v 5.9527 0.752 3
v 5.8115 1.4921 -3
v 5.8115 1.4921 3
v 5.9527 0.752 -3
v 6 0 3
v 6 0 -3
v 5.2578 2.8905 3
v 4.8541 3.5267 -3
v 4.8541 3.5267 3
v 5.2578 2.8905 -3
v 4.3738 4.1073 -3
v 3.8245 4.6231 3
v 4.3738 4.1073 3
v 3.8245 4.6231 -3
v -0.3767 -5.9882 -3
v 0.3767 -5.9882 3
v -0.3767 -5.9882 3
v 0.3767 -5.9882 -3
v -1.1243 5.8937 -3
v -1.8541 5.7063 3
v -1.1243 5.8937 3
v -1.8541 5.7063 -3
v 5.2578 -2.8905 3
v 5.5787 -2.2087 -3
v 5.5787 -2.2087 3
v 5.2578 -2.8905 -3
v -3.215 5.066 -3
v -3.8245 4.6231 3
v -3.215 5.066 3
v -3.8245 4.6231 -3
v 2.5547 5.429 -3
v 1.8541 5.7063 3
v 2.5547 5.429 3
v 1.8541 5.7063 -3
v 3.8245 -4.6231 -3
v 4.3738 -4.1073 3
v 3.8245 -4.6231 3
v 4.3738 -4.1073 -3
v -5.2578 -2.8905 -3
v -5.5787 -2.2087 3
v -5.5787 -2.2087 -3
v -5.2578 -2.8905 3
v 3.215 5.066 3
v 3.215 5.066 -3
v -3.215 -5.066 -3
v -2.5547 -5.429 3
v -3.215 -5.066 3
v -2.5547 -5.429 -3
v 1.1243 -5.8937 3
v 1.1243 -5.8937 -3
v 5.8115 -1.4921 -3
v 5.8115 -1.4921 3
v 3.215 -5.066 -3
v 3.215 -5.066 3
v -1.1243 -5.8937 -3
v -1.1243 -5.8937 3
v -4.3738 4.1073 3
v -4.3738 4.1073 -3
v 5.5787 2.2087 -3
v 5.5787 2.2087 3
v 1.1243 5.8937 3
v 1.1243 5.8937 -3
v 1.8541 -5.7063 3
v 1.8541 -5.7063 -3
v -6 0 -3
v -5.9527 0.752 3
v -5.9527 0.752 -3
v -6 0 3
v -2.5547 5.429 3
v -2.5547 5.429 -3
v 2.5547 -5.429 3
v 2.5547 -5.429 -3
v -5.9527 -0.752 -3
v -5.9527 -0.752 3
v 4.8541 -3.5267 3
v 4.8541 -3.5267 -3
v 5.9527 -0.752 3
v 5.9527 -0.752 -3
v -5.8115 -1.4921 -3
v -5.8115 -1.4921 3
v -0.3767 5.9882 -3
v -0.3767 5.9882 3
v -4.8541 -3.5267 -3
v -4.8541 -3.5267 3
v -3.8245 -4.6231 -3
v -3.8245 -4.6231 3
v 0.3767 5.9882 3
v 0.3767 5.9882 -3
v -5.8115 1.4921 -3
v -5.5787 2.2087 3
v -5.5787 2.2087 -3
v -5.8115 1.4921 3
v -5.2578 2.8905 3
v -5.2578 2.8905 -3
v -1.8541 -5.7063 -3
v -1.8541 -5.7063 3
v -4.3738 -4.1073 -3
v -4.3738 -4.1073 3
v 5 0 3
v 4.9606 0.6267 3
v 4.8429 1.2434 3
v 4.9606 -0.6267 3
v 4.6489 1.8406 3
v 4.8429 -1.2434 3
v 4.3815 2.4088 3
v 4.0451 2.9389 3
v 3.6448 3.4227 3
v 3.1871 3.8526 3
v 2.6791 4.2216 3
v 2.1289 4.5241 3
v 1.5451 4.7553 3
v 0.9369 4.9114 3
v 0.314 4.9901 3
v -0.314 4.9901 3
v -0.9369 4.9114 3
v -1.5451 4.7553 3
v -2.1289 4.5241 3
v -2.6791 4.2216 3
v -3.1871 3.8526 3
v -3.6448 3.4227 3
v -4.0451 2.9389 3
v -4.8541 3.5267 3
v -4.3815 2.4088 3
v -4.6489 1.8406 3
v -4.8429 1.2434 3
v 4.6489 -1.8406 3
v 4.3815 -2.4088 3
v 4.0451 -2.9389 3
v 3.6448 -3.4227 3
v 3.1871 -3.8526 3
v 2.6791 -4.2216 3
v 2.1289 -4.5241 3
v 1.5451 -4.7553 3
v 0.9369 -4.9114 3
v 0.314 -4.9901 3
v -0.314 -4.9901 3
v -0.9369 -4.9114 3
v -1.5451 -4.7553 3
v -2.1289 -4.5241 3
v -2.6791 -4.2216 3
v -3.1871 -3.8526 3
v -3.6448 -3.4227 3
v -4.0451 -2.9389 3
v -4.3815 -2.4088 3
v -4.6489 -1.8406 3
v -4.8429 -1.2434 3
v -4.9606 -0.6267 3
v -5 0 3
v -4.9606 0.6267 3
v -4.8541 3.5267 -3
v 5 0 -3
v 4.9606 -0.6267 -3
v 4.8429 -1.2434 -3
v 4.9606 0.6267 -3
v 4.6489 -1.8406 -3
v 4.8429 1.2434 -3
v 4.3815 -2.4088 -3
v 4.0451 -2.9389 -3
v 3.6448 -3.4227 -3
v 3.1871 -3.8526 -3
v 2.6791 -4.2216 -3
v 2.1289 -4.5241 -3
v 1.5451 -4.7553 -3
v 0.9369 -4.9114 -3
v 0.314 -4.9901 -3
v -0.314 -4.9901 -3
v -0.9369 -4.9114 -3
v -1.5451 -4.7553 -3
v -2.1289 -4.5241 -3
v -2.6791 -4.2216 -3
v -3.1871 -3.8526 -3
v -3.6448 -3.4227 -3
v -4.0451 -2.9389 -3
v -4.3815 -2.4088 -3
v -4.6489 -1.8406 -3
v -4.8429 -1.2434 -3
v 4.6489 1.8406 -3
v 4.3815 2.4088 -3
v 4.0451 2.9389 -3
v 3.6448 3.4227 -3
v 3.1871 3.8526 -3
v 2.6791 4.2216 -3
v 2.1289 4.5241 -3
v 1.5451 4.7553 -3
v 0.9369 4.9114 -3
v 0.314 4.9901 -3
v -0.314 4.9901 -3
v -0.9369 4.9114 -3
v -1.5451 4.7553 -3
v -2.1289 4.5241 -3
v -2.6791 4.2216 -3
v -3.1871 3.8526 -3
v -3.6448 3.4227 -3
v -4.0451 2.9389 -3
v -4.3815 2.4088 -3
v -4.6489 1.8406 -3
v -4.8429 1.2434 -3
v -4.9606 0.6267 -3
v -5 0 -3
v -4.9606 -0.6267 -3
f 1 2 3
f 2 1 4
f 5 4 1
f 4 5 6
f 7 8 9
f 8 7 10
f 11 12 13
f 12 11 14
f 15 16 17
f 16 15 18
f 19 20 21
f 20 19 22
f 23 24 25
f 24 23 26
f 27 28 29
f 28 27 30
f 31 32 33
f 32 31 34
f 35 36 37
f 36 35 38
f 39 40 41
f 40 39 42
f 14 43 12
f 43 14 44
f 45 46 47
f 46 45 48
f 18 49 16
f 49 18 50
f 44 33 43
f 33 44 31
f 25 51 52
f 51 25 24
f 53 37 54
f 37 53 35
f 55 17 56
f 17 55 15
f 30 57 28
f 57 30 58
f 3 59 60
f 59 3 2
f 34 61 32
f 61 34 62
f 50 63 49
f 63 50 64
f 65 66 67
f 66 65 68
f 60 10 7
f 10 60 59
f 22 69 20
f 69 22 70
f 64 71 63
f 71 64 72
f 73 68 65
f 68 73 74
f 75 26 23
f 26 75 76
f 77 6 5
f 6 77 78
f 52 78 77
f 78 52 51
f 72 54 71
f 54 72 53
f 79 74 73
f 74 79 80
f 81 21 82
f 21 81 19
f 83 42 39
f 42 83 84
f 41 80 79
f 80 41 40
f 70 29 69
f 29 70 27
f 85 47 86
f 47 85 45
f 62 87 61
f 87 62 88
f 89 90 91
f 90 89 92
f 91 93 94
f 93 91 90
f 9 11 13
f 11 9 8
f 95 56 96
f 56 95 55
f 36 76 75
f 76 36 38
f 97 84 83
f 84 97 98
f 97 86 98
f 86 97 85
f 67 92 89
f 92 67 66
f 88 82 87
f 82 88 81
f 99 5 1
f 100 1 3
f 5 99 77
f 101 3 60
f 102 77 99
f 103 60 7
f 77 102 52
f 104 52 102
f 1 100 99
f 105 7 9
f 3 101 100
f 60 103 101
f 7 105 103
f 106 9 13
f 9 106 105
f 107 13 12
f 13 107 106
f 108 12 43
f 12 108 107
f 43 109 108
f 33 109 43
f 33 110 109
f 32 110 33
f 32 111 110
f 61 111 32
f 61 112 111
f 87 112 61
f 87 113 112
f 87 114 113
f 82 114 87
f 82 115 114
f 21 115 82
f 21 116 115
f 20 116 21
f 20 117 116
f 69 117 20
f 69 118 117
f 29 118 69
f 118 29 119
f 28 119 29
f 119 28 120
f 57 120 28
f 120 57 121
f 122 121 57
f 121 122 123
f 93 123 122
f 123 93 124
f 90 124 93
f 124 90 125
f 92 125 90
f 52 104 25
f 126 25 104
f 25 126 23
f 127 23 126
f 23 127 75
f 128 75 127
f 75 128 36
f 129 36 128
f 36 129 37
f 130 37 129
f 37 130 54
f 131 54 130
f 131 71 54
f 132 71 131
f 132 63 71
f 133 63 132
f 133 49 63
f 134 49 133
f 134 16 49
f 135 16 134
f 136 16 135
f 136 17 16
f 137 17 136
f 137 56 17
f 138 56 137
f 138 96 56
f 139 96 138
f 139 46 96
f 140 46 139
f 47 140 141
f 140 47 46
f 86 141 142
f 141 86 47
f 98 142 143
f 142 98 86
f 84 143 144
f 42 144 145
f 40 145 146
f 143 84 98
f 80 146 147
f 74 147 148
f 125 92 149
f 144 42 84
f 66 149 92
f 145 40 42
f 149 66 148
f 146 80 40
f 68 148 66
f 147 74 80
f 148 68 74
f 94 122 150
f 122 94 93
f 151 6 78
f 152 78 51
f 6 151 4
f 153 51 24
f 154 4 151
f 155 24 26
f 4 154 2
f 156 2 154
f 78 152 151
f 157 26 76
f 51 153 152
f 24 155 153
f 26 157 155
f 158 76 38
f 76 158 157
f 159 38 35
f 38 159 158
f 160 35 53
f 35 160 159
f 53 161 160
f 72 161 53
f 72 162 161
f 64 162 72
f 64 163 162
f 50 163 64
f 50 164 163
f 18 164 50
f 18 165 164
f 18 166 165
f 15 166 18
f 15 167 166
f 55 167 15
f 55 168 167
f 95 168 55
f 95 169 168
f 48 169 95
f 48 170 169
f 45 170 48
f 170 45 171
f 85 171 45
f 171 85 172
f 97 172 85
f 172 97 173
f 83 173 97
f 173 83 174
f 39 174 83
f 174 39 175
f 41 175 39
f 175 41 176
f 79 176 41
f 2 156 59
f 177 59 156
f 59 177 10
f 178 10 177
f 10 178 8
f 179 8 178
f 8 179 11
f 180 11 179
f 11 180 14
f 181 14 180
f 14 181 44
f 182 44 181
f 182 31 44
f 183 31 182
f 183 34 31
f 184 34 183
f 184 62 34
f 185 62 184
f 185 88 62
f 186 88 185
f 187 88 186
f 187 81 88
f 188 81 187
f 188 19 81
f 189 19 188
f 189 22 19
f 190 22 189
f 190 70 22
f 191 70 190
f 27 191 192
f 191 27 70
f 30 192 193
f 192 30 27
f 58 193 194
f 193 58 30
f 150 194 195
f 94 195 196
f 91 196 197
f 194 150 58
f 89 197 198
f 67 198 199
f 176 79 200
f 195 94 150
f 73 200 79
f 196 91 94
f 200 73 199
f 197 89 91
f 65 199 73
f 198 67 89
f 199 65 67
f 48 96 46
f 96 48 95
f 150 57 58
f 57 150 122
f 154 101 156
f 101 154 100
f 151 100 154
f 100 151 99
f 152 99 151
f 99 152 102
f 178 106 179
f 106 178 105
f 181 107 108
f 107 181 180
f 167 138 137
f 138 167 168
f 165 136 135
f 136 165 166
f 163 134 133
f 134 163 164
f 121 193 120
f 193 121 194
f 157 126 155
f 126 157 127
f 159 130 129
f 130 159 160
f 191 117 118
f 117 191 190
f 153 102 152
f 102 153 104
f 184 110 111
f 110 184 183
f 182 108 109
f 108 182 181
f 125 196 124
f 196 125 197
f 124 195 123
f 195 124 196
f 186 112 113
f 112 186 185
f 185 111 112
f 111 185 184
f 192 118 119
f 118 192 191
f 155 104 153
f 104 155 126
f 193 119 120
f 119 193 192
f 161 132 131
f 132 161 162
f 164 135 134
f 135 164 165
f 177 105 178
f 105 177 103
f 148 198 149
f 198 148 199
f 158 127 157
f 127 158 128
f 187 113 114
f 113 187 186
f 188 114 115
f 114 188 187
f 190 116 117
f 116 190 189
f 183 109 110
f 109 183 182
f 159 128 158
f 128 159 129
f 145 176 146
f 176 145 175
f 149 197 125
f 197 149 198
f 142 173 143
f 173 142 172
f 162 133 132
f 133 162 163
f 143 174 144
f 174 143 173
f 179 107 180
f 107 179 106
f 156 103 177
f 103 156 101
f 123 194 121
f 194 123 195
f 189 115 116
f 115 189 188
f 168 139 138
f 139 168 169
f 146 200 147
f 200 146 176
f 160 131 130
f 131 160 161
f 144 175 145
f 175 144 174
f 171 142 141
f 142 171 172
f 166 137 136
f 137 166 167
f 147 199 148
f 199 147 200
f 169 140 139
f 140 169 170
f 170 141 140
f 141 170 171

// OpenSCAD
$fn = 50;


difference() {
	union() {
		translate(v = [0, 0, -3.0000000000]) {
			cylinder(h = 6, r = 6.0000000000);
		}
	}
	union() {
		translate(v = [0, 0, -100.0000000000]) {
			cylinder(h = 200, r = 5.0000000000);
		}
	}
}
